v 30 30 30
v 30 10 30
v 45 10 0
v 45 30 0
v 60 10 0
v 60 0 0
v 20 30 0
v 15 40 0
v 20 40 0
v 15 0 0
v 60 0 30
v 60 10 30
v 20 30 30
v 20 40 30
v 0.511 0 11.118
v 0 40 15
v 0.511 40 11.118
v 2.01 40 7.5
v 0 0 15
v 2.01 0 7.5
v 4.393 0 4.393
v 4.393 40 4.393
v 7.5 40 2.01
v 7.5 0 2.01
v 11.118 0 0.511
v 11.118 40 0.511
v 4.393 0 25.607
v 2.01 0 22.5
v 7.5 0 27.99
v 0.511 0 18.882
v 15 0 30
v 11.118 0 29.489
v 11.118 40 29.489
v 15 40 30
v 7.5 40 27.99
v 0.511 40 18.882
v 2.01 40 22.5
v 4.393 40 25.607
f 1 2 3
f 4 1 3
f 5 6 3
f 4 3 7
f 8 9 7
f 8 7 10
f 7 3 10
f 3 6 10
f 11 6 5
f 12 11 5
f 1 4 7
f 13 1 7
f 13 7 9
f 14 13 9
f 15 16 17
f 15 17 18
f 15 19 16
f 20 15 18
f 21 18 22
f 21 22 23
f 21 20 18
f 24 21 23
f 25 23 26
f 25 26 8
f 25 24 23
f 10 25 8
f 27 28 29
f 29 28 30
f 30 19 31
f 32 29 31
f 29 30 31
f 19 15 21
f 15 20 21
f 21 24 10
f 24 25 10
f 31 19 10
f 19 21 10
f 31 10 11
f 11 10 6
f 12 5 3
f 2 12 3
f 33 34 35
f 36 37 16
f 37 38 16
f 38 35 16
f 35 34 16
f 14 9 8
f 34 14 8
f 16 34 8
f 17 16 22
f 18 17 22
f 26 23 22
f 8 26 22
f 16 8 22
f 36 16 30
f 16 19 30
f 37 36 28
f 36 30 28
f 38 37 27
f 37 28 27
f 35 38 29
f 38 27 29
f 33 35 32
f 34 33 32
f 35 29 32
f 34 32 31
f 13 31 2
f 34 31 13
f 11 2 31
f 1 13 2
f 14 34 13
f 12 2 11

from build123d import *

# Parameters (mm, degrees)
F1_DEPTH = 30
F2_R     = 14.99999
F4_DEPTH = 20


# Not quite as in the source:
# - a fillet or chamfer is up to 0.001 mm smaller than in the source, because OpenCascade refuses the exact size


with BuildPart() as f1:
    # F0 (on Top) → F1 (new body)
    with BuildSketch(Plane.XY):
        Polygon((0, 40), (0, 0), (60, 0), (60, 10), (30, 10), (30, 30), (20, 30), (20, 40), align=None)
    extrude(amount=F1_DEPTH)

    # F2 (radius 15 in the source; OpenCascade refuses exactly that, so slightly less here)
    f2_edges = [f1.edges().sort_by_distance(p)[0] for p in [
        (0, 20, 30),
        (0, 20, 0),
    ]]
    fillet(f2_edges, radius=F2_R)

    # F3 (on face) → F4 (join)
    with BuildSketch(Plane(origin=(0, 10, 0), x_dir=(-1, 0, 0), z_dir=(0, 1, 0))):
        Polygon((-30, 0), (-30, 30), (-45, 0), align=None)
    extrude(amount=F4_DEPTH)


solid = f1.part
